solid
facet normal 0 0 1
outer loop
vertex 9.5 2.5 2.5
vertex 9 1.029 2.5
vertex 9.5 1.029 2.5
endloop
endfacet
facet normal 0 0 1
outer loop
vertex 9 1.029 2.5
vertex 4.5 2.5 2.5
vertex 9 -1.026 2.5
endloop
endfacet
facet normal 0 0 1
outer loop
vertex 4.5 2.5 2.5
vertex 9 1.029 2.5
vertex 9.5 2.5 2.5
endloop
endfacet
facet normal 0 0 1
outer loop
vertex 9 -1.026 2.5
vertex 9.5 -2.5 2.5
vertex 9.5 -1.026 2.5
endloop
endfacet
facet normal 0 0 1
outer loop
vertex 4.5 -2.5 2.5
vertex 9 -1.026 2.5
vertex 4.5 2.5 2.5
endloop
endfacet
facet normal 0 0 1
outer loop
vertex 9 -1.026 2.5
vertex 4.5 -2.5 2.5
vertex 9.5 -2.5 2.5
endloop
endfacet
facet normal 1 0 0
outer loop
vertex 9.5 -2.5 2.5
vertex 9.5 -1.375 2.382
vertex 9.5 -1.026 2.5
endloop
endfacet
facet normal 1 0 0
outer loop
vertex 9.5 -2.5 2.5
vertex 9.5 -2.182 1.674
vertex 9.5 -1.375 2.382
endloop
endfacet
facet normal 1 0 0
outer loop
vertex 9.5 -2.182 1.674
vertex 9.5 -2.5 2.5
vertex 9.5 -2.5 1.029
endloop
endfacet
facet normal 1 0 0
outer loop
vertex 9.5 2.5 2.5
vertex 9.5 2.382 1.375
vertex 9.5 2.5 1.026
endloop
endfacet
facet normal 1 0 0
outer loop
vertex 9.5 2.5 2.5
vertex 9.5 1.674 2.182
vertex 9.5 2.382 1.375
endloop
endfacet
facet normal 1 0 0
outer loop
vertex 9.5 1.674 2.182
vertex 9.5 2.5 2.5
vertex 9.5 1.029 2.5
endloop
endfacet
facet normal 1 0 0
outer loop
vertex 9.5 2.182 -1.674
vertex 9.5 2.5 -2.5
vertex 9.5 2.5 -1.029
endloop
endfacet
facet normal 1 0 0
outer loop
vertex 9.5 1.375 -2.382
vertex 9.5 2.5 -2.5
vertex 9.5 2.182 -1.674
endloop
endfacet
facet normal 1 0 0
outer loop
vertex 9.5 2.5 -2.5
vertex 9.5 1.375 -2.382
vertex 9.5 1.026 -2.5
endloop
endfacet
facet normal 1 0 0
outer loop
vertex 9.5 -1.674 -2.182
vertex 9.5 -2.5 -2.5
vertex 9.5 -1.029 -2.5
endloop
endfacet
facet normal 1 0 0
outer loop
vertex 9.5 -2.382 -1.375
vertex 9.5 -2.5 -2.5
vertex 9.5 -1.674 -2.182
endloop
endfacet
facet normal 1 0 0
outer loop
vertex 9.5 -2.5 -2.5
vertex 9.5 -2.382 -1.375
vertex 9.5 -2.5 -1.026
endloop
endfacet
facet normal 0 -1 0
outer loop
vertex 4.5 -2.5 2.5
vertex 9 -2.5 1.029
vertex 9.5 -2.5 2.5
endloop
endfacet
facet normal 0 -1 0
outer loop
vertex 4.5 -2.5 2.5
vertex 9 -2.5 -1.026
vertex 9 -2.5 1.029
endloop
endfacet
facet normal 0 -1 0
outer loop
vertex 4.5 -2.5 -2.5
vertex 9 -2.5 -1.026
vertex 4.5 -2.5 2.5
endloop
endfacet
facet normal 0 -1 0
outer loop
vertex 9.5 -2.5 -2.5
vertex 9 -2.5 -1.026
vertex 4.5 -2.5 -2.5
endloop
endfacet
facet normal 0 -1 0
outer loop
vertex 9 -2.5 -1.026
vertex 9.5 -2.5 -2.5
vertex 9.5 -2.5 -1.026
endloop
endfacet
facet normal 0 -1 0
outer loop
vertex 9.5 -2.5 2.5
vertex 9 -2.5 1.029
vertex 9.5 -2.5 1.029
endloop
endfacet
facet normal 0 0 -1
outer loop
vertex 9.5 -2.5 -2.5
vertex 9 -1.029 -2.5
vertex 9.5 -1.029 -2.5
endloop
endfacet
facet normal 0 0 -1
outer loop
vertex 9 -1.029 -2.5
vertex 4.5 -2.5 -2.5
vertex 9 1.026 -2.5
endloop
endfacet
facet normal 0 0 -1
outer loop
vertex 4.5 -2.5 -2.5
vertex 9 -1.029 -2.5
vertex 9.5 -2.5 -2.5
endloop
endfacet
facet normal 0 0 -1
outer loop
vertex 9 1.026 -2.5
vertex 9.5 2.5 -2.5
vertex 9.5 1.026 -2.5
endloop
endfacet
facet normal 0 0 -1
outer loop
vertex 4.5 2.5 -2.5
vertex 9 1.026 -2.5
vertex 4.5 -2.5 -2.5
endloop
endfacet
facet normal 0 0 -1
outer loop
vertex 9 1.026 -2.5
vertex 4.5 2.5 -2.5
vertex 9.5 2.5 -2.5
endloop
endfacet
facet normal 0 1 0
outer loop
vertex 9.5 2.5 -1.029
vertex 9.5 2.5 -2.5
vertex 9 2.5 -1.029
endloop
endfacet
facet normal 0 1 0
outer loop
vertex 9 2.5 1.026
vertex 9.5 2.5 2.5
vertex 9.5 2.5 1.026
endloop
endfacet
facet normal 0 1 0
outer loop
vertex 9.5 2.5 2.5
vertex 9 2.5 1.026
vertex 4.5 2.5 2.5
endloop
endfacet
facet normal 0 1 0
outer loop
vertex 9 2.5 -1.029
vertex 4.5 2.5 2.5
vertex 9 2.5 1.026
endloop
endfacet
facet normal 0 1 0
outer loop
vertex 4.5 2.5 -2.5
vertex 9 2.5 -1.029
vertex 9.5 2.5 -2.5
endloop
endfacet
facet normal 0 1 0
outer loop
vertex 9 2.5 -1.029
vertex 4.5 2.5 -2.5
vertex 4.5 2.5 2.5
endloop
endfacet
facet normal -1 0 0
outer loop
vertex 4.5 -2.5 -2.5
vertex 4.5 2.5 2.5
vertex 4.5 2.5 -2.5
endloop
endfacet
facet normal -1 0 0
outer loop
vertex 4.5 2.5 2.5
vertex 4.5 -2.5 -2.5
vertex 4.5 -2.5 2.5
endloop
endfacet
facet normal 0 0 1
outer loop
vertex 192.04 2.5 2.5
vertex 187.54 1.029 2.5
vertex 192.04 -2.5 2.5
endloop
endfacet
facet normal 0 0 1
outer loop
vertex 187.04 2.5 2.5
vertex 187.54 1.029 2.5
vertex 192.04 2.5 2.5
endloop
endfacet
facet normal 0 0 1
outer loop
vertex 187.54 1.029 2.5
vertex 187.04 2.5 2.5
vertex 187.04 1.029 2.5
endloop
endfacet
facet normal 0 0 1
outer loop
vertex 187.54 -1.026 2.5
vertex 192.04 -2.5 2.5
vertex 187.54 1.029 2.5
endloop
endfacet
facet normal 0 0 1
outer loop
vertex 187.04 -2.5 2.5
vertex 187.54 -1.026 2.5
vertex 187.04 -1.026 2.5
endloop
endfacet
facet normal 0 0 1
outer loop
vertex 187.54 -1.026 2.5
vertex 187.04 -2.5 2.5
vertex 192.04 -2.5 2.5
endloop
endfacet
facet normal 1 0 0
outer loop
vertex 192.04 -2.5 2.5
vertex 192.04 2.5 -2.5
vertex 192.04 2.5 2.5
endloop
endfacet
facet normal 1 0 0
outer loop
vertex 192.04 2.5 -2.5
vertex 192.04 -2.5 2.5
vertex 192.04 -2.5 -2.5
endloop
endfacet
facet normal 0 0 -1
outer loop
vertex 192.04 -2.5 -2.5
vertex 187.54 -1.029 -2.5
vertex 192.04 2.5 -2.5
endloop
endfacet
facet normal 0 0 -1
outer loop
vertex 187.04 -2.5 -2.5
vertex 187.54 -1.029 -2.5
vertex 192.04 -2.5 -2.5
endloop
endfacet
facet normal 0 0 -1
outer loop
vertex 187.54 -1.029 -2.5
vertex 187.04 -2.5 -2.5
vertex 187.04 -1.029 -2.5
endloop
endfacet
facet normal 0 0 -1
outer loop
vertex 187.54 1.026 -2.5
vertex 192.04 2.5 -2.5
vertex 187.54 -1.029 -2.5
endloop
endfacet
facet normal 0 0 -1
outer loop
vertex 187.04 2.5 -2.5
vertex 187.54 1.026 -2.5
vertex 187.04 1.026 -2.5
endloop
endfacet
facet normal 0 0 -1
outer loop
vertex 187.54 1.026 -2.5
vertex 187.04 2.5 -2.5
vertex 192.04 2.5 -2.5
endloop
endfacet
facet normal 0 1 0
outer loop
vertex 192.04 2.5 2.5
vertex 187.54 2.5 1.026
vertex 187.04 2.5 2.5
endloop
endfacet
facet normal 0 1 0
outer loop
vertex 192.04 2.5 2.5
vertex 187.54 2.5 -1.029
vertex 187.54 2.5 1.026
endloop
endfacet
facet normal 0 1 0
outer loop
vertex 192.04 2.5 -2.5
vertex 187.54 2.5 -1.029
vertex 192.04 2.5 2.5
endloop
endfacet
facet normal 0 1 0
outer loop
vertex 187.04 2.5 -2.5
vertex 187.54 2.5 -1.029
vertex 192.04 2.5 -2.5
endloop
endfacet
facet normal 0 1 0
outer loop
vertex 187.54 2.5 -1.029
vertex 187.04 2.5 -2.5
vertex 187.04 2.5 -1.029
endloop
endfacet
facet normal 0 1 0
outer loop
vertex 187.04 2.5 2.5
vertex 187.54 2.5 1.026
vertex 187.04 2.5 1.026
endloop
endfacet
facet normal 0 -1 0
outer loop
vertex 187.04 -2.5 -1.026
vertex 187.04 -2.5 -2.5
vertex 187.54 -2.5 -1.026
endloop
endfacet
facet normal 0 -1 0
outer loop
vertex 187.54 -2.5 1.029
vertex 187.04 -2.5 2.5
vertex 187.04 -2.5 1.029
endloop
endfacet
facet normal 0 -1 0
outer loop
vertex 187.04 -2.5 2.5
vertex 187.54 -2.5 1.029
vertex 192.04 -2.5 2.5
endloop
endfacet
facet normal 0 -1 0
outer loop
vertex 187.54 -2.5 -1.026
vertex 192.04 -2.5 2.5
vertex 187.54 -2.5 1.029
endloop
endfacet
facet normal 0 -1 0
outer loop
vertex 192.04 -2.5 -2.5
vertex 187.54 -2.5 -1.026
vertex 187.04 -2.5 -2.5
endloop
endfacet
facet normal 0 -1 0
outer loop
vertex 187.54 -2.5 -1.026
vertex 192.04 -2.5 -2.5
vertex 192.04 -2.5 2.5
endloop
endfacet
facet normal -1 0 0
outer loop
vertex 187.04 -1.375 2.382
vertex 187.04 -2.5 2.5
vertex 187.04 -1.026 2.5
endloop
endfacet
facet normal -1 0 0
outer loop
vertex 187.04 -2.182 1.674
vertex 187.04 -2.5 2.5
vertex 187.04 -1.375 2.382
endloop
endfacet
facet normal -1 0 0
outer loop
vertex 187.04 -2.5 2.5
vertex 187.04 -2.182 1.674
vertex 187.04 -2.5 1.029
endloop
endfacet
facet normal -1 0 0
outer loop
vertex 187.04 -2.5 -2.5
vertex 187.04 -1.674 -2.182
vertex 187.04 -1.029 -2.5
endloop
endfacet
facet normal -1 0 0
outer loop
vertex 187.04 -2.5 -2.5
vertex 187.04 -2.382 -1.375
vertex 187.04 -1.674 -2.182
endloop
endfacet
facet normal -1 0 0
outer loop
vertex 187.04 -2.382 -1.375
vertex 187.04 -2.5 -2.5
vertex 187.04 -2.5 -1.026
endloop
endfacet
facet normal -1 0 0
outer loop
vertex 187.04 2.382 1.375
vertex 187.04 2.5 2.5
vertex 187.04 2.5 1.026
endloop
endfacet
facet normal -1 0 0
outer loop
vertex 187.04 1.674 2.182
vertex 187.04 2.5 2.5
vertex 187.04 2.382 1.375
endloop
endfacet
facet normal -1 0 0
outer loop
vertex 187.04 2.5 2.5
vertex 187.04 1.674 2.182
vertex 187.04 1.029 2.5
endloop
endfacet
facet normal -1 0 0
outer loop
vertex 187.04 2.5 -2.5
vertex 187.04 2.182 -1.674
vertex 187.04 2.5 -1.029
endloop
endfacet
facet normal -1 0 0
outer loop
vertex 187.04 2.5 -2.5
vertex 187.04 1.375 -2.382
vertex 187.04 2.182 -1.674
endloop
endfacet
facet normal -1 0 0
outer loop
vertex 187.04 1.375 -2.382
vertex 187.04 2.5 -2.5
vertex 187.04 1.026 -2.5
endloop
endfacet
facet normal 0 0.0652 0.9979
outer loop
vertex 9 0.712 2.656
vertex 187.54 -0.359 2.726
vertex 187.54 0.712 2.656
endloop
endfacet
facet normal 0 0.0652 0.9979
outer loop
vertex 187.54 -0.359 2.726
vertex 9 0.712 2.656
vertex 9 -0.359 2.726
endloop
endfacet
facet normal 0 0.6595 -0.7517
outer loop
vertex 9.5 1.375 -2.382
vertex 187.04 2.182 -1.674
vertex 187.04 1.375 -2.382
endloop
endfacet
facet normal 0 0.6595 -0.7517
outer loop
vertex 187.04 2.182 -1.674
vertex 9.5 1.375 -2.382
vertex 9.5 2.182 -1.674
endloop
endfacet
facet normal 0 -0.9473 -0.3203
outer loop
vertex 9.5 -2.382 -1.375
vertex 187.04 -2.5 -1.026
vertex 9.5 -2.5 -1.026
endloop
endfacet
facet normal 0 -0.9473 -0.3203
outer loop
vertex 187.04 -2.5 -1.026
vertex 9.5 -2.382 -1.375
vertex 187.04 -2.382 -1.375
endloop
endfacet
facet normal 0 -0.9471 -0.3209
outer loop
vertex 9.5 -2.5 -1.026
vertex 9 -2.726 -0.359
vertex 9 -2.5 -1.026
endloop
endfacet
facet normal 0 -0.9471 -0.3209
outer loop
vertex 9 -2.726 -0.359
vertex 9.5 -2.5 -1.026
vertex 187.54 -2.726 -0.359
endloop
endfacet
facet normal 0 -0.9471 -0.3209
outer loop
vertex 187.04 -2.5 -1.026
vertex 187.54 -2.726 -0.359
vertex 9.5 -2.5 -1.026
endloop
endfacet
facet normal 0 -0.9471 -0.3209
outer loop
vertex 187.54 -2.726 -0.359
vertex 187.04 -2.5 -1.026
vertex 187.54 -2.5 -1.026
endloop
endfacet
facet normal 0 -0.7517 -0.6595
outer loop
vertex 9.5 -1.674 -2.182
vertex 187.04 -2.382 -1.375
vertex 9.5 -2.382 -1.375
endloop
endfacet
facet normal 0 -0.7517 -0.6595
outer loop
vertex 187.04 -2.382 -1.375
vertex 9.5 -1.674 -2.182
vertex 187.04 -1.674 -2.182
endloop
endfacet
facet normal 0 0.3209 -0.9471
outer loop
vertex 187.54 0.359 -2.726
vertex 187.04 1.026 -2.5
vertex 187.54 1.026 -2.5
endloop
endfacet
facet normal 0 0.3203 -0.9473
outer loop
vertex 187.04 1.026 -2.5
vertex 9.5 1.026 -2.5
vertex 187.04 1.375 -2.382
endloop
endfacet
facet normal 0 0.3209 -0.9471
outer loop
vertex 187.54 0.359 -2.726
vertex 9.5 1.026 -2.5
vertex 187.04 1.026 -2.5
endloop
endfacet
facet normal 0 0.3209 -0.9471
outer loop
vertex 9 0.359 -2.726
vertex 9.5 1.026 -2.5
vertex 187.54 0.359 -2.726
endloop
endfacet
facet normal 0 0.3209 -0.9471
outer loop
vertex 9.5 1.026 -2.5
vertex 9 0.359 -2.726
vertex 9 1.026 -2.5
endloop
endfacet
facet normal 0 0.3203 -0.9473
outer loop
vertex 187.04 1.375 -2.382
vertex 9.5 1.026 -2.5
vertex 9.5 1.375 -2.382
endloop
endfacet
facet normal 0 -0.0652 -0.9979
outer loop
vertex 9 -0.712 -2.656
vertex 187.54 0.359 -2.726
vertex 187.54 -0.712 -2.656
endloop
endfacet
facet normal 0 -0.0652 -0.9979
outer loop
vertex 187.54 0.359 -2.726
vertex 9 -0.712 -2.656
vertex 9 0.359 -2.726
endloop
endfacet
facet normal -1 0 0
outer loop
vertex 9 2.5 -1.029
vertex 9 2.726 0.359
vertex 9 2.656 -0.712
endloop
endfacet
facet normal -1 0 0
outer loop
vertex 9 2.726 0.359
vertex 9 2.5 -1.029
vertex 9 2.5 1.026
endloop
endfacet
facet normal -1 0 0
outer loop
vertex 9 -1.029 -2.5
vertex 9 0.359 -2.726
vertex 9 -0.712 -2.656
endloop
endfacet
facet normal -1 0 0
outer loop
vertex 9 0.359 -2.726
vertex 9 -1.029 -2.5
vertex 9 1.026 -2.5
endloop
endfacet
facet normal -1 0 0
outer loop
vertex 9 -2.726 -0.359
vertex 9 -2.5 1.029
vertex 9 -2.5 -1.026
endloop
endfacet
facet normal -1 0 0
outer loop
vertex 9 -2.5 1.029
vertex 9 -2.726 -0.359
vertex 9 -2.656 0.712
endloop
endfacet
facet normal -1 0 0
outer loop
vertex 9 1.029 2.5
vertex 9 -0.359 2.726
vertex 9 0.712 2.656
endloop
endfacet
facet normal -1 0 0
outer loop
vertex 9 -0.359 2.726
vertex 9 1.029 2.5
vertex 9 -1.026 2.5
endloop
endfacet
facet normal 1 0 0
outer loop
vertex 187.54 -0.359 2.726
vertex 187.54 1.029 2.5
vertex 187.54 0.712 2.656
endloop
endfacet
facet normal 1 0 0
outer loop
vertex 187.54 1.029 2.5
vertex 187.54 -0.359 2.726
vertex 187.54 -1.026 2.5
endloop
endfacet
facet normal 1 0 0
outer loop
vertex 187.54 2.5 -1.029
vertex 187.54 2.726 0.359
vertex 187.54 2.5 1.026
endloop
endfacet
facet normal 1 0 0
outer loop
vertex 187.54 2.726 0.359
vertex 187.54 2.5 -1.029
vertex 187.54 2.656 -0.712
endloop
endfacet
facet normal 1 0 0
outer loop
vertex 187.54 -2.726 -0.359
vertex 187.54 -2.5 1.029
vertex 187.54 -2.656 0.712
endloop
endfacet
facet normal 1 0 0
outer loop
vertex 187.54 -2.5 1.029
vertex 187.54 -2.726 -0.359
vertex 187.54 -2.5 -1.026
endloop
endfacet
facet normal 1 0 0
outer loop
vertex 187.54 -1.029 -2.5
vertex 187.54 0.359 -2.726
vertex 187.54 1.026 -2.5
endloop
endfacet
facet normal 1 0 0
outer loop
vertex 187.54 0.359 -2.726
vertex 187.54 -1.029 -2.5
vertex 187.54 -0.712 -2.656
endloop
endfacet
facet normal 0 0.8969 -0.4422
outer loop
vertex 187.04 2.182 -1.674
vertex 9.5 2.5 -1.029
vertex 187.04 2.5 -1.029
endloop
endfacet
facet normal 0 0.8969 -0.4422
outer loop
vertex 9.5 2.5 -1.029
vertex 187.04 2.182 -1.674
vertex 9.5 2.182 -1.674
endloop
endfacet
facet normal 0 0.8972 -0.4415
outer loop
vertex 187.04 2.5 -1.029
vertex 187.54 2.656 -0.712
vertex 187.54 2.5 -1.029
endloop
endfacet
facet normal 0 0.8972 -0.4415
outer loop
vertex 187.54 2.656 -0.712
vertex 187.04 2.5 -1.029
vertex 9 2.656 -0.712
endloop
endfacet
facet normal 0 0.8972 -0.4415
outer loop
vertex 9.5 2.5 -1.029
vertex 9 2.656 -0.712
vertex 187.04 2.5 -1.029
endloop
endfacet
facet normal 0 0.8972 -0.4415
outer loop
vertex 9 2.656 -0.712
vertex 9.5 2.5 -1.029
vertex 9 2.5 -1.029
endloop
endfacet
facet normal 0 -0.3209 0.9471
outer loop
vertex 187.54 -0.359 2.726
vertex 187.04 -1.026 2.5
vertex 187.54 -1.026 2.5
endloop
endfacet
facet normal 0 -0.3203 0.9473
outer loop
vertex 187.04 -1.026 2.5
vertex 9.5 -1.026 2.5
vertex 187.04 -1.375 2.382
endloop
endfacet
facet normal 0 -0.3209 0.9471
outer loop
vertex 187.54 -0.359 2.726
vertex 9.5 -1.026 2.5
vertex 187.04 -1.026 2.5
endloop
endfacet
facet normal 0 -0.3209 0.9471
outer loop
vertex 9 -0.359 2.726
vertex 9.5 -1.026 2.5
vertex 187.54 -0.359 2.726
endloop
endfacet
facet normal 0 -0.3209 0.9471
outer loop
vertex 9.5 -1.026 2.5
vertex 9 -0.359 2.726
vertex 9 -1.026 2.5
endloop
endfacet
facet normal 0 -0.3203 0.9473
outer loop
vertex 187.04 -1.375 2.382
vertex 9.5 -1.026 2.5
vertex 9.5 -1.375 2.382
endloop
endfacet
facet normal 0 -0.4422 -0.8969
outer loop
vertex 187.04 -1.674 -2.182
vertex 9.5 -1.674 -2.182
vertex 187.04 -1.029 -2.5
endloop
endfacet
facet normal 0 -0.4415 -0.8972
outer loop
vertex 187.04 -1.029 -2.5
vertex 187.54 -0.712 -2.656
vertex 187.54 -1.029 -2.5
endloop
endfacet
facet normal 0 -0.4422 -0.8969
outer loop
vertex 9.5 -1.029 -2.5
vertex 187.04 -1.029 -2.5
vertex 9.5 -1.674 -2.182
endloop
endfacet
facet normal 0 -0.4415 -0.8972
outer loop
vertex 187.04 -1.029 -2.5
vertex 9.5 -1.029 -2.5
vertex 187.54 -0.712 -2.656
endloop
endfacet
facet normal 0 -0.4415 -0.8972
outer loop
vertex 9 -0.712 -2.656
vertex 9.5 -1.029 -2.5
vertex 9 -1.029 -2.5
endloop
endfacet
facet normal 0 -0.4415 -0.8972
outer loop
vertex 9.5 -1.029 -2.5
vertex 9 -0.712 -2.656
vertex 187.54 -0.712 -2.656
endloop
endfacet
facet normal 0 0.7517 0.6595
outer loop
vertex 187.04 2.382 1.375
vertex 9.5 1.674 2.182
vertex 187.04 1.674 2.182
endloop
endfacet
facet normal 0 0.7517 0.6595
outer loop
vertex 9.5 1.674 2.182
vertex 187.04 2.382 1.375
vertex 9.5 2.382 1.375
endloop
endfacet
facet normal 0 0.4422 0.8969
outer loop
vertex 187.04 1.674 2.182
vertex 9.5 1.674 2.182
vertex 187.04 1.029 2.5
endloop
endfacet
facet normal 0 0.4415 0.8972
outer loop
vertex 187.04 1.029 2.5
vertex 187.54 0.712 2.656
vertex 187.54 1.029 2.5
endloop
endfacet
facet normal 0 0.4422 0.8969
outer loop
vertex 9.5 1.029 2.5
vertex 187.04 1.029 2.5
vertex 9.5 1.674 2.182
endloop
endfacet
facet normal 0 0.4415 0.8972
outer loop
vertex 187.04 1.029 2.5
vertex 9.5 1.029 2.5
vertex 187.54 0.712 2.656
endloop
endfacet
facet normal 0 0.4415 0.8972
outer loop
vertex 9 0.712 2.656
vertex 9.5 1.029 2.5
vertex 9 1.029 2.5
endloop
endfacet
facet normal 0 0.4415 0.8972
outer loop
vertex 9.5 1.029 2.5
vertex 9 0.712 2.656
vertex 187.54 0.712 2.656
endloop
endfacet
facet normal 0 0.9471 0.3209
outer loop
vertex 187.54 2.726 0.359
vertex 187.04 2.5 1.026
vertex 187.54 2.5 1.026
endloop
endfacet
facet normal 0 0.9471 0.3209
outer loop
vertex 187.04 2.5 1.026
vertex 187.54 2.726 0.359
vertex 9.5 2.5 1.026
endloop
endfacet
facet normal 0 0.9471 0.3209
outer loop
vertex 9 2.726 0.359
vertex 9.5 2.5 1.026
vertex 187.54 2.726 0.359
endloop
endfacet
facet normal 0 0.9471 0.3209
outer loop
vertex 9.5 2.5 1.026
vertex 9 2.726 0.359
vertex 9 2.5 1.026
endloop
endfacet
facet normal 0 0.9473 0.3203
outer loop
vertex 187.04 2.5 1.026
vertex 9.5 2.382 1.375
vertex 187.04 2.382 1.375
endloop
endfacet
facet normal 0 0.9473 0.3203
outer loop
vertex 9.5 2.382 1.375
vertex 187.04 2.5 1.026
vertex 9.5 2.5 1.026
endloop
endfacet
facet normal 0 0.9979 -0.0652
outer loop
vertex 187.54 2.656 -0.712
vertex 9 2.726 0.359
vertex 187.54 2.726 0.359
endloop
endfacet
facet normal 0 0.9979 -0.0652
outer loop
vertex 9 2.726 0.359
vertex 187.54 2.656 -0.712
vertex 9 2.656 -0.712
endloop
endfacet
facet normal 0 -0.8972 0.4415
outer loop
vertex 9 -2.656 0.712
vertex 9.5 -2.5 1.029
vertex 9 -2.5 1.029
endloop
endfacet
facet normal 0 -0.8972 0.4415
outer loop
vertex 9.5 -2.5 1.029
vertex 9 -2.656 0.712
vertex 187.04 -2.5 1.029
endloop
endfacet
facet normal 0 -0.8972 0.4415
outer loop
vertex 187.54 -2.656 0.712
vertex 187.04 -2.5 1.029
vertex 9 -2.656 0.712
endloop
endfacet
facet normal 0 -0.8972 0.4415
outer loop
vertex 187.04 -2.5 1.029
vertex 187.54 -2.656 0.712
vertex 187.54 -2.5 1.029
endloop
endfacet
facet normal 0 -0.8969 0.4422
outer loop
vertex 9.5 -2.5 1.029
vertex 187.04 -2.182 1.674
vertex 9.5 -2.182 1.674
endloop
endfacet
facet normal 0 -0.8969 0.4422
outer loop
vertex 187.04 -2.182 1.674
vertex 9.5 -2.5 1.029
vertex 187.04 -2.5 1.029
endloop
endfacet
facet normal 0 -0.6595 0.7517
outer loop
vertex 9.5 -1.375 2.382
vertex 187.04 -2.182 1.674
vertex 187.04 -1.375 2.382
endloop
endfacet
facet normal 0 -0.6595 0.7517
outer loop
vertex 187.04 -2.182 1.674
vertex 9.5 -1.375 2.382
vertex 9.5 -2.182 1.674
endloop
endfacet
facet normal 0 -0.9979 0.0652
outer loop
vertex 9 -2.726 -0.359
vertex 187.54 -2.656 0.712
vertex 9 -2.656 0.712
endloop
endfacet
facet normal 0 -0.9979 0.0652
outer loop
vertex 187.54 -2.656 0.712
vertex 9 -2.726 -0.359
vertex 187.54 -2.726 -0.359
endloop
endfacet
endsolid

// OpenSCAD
// file: configuration.scad
motor_end_height=44;
//idler_end_height=28;
idler_end_height=44;
carriage_height=24;
platform_thickness=8;

sanguinololu=true;					// places mounting holes for the Sanguinololu controller
carbon_rods=true;					// turns on option for carbon diagonal rods just for looks!

frame_thickness=6;   				// 6mm acrylic
pcb_thickness=2;						// used for rendering PCB and approximating build volume

smooth_rod_length=495;  				// determins vertical build height with 508 for 8" 
rod_diameter=8;						// might be interesting to have larger rods
platform_hinge_offset=33;
carriage_hinge_offset=22;

printbed=[155,155];  				// printrbed 6x6 -  210,210 for prusa 8x8 platform
printbed_screw_spacing=[146.5,147]; 	// sets screw spacing for heated bed default: printrbed

tower_radius = printbed[0]*0.9;
//rod_length=printbed[0]*1.2;
rod_length=187+9.54;

corner_radius=12;
frame_radius=(tower_radius-rod_diameter/2-corner_radius)/cos(30);

//jjt
magnetsize=9.52/2;
// main file
include <configuration.scad>

l = rod_length;
h = 7;

// Wipe nozzle after long travel moves.
module collar() {
  difference() {
    cube([4, 20, h], center=true);
    cube([2, 18, h+1], center=true);
    rotate([0, 90, 0]) rotate([0, 0, 30])
      cylinder(r=5, h=5, center=true, $fn=6);
  }
}

// Small hollow cube.
module cubicle() {
  difference() {
    cube([6, 6, h], center=true);
    cube([4, 4, h+1], center=true);
  }
}

// Nozzle wipers.
module wipers() {
  translate([l/2+2, 0, 0]) cubicle();
  translate([-l/2-2, 0, 0]) cubicle();
  translate([l/2-25, 0, 0]) collar();
  translate([-l/2+25, 0, 0]) collar();
}

// Rod with two Y shaped rod ends.
module rod(l) {
  translate([l/2,0,0])
  union() {
//    translate([-l/2, 0, 0]) jaws();
 //   translate([l/2, 0, 0]) rotate([0, 0, 180]) jaws();
    translate([-l/2, 0, 0]) rotate([0, 0, 180]) translate([-7,0,0]) cube([5,5,5],center=true);
    translate([l/2, 0, 0]) rotate([0, 0, 180]) translate([7,0,0]) cube([5,5,5],center=true);
	if(carbon_rods) color([0.1, 0.1, 0.1]) rotate([0, 90, 0]) rotate([0, 0, 30])
		cylinder(r=5.5/2, h=l-18, center=true, $fn=16);
	else rotate([0, 90, 0]) rotate([0, 0, 30])
		cylinder(r=h/2 / cos(30), h=l-18, center=true, $fn=6);
  }
}

module printable_rod(l)
{
	// Print platform.
	bed = 8*25.4; // 8x8 inches.
	% translate([0, 0, -1]) cube([bed, bed, 2], center=true);

	rotate(45)
	translate([-l/2,0,h/2])
	rod(l=l);

	// If your nozzle doesn't ooze at all, you can comment the next line out.
	translate([0,0,h/2])
	rotate(45)
	wipers();
}

rod(l=l);
//printable_rod(l=l);
